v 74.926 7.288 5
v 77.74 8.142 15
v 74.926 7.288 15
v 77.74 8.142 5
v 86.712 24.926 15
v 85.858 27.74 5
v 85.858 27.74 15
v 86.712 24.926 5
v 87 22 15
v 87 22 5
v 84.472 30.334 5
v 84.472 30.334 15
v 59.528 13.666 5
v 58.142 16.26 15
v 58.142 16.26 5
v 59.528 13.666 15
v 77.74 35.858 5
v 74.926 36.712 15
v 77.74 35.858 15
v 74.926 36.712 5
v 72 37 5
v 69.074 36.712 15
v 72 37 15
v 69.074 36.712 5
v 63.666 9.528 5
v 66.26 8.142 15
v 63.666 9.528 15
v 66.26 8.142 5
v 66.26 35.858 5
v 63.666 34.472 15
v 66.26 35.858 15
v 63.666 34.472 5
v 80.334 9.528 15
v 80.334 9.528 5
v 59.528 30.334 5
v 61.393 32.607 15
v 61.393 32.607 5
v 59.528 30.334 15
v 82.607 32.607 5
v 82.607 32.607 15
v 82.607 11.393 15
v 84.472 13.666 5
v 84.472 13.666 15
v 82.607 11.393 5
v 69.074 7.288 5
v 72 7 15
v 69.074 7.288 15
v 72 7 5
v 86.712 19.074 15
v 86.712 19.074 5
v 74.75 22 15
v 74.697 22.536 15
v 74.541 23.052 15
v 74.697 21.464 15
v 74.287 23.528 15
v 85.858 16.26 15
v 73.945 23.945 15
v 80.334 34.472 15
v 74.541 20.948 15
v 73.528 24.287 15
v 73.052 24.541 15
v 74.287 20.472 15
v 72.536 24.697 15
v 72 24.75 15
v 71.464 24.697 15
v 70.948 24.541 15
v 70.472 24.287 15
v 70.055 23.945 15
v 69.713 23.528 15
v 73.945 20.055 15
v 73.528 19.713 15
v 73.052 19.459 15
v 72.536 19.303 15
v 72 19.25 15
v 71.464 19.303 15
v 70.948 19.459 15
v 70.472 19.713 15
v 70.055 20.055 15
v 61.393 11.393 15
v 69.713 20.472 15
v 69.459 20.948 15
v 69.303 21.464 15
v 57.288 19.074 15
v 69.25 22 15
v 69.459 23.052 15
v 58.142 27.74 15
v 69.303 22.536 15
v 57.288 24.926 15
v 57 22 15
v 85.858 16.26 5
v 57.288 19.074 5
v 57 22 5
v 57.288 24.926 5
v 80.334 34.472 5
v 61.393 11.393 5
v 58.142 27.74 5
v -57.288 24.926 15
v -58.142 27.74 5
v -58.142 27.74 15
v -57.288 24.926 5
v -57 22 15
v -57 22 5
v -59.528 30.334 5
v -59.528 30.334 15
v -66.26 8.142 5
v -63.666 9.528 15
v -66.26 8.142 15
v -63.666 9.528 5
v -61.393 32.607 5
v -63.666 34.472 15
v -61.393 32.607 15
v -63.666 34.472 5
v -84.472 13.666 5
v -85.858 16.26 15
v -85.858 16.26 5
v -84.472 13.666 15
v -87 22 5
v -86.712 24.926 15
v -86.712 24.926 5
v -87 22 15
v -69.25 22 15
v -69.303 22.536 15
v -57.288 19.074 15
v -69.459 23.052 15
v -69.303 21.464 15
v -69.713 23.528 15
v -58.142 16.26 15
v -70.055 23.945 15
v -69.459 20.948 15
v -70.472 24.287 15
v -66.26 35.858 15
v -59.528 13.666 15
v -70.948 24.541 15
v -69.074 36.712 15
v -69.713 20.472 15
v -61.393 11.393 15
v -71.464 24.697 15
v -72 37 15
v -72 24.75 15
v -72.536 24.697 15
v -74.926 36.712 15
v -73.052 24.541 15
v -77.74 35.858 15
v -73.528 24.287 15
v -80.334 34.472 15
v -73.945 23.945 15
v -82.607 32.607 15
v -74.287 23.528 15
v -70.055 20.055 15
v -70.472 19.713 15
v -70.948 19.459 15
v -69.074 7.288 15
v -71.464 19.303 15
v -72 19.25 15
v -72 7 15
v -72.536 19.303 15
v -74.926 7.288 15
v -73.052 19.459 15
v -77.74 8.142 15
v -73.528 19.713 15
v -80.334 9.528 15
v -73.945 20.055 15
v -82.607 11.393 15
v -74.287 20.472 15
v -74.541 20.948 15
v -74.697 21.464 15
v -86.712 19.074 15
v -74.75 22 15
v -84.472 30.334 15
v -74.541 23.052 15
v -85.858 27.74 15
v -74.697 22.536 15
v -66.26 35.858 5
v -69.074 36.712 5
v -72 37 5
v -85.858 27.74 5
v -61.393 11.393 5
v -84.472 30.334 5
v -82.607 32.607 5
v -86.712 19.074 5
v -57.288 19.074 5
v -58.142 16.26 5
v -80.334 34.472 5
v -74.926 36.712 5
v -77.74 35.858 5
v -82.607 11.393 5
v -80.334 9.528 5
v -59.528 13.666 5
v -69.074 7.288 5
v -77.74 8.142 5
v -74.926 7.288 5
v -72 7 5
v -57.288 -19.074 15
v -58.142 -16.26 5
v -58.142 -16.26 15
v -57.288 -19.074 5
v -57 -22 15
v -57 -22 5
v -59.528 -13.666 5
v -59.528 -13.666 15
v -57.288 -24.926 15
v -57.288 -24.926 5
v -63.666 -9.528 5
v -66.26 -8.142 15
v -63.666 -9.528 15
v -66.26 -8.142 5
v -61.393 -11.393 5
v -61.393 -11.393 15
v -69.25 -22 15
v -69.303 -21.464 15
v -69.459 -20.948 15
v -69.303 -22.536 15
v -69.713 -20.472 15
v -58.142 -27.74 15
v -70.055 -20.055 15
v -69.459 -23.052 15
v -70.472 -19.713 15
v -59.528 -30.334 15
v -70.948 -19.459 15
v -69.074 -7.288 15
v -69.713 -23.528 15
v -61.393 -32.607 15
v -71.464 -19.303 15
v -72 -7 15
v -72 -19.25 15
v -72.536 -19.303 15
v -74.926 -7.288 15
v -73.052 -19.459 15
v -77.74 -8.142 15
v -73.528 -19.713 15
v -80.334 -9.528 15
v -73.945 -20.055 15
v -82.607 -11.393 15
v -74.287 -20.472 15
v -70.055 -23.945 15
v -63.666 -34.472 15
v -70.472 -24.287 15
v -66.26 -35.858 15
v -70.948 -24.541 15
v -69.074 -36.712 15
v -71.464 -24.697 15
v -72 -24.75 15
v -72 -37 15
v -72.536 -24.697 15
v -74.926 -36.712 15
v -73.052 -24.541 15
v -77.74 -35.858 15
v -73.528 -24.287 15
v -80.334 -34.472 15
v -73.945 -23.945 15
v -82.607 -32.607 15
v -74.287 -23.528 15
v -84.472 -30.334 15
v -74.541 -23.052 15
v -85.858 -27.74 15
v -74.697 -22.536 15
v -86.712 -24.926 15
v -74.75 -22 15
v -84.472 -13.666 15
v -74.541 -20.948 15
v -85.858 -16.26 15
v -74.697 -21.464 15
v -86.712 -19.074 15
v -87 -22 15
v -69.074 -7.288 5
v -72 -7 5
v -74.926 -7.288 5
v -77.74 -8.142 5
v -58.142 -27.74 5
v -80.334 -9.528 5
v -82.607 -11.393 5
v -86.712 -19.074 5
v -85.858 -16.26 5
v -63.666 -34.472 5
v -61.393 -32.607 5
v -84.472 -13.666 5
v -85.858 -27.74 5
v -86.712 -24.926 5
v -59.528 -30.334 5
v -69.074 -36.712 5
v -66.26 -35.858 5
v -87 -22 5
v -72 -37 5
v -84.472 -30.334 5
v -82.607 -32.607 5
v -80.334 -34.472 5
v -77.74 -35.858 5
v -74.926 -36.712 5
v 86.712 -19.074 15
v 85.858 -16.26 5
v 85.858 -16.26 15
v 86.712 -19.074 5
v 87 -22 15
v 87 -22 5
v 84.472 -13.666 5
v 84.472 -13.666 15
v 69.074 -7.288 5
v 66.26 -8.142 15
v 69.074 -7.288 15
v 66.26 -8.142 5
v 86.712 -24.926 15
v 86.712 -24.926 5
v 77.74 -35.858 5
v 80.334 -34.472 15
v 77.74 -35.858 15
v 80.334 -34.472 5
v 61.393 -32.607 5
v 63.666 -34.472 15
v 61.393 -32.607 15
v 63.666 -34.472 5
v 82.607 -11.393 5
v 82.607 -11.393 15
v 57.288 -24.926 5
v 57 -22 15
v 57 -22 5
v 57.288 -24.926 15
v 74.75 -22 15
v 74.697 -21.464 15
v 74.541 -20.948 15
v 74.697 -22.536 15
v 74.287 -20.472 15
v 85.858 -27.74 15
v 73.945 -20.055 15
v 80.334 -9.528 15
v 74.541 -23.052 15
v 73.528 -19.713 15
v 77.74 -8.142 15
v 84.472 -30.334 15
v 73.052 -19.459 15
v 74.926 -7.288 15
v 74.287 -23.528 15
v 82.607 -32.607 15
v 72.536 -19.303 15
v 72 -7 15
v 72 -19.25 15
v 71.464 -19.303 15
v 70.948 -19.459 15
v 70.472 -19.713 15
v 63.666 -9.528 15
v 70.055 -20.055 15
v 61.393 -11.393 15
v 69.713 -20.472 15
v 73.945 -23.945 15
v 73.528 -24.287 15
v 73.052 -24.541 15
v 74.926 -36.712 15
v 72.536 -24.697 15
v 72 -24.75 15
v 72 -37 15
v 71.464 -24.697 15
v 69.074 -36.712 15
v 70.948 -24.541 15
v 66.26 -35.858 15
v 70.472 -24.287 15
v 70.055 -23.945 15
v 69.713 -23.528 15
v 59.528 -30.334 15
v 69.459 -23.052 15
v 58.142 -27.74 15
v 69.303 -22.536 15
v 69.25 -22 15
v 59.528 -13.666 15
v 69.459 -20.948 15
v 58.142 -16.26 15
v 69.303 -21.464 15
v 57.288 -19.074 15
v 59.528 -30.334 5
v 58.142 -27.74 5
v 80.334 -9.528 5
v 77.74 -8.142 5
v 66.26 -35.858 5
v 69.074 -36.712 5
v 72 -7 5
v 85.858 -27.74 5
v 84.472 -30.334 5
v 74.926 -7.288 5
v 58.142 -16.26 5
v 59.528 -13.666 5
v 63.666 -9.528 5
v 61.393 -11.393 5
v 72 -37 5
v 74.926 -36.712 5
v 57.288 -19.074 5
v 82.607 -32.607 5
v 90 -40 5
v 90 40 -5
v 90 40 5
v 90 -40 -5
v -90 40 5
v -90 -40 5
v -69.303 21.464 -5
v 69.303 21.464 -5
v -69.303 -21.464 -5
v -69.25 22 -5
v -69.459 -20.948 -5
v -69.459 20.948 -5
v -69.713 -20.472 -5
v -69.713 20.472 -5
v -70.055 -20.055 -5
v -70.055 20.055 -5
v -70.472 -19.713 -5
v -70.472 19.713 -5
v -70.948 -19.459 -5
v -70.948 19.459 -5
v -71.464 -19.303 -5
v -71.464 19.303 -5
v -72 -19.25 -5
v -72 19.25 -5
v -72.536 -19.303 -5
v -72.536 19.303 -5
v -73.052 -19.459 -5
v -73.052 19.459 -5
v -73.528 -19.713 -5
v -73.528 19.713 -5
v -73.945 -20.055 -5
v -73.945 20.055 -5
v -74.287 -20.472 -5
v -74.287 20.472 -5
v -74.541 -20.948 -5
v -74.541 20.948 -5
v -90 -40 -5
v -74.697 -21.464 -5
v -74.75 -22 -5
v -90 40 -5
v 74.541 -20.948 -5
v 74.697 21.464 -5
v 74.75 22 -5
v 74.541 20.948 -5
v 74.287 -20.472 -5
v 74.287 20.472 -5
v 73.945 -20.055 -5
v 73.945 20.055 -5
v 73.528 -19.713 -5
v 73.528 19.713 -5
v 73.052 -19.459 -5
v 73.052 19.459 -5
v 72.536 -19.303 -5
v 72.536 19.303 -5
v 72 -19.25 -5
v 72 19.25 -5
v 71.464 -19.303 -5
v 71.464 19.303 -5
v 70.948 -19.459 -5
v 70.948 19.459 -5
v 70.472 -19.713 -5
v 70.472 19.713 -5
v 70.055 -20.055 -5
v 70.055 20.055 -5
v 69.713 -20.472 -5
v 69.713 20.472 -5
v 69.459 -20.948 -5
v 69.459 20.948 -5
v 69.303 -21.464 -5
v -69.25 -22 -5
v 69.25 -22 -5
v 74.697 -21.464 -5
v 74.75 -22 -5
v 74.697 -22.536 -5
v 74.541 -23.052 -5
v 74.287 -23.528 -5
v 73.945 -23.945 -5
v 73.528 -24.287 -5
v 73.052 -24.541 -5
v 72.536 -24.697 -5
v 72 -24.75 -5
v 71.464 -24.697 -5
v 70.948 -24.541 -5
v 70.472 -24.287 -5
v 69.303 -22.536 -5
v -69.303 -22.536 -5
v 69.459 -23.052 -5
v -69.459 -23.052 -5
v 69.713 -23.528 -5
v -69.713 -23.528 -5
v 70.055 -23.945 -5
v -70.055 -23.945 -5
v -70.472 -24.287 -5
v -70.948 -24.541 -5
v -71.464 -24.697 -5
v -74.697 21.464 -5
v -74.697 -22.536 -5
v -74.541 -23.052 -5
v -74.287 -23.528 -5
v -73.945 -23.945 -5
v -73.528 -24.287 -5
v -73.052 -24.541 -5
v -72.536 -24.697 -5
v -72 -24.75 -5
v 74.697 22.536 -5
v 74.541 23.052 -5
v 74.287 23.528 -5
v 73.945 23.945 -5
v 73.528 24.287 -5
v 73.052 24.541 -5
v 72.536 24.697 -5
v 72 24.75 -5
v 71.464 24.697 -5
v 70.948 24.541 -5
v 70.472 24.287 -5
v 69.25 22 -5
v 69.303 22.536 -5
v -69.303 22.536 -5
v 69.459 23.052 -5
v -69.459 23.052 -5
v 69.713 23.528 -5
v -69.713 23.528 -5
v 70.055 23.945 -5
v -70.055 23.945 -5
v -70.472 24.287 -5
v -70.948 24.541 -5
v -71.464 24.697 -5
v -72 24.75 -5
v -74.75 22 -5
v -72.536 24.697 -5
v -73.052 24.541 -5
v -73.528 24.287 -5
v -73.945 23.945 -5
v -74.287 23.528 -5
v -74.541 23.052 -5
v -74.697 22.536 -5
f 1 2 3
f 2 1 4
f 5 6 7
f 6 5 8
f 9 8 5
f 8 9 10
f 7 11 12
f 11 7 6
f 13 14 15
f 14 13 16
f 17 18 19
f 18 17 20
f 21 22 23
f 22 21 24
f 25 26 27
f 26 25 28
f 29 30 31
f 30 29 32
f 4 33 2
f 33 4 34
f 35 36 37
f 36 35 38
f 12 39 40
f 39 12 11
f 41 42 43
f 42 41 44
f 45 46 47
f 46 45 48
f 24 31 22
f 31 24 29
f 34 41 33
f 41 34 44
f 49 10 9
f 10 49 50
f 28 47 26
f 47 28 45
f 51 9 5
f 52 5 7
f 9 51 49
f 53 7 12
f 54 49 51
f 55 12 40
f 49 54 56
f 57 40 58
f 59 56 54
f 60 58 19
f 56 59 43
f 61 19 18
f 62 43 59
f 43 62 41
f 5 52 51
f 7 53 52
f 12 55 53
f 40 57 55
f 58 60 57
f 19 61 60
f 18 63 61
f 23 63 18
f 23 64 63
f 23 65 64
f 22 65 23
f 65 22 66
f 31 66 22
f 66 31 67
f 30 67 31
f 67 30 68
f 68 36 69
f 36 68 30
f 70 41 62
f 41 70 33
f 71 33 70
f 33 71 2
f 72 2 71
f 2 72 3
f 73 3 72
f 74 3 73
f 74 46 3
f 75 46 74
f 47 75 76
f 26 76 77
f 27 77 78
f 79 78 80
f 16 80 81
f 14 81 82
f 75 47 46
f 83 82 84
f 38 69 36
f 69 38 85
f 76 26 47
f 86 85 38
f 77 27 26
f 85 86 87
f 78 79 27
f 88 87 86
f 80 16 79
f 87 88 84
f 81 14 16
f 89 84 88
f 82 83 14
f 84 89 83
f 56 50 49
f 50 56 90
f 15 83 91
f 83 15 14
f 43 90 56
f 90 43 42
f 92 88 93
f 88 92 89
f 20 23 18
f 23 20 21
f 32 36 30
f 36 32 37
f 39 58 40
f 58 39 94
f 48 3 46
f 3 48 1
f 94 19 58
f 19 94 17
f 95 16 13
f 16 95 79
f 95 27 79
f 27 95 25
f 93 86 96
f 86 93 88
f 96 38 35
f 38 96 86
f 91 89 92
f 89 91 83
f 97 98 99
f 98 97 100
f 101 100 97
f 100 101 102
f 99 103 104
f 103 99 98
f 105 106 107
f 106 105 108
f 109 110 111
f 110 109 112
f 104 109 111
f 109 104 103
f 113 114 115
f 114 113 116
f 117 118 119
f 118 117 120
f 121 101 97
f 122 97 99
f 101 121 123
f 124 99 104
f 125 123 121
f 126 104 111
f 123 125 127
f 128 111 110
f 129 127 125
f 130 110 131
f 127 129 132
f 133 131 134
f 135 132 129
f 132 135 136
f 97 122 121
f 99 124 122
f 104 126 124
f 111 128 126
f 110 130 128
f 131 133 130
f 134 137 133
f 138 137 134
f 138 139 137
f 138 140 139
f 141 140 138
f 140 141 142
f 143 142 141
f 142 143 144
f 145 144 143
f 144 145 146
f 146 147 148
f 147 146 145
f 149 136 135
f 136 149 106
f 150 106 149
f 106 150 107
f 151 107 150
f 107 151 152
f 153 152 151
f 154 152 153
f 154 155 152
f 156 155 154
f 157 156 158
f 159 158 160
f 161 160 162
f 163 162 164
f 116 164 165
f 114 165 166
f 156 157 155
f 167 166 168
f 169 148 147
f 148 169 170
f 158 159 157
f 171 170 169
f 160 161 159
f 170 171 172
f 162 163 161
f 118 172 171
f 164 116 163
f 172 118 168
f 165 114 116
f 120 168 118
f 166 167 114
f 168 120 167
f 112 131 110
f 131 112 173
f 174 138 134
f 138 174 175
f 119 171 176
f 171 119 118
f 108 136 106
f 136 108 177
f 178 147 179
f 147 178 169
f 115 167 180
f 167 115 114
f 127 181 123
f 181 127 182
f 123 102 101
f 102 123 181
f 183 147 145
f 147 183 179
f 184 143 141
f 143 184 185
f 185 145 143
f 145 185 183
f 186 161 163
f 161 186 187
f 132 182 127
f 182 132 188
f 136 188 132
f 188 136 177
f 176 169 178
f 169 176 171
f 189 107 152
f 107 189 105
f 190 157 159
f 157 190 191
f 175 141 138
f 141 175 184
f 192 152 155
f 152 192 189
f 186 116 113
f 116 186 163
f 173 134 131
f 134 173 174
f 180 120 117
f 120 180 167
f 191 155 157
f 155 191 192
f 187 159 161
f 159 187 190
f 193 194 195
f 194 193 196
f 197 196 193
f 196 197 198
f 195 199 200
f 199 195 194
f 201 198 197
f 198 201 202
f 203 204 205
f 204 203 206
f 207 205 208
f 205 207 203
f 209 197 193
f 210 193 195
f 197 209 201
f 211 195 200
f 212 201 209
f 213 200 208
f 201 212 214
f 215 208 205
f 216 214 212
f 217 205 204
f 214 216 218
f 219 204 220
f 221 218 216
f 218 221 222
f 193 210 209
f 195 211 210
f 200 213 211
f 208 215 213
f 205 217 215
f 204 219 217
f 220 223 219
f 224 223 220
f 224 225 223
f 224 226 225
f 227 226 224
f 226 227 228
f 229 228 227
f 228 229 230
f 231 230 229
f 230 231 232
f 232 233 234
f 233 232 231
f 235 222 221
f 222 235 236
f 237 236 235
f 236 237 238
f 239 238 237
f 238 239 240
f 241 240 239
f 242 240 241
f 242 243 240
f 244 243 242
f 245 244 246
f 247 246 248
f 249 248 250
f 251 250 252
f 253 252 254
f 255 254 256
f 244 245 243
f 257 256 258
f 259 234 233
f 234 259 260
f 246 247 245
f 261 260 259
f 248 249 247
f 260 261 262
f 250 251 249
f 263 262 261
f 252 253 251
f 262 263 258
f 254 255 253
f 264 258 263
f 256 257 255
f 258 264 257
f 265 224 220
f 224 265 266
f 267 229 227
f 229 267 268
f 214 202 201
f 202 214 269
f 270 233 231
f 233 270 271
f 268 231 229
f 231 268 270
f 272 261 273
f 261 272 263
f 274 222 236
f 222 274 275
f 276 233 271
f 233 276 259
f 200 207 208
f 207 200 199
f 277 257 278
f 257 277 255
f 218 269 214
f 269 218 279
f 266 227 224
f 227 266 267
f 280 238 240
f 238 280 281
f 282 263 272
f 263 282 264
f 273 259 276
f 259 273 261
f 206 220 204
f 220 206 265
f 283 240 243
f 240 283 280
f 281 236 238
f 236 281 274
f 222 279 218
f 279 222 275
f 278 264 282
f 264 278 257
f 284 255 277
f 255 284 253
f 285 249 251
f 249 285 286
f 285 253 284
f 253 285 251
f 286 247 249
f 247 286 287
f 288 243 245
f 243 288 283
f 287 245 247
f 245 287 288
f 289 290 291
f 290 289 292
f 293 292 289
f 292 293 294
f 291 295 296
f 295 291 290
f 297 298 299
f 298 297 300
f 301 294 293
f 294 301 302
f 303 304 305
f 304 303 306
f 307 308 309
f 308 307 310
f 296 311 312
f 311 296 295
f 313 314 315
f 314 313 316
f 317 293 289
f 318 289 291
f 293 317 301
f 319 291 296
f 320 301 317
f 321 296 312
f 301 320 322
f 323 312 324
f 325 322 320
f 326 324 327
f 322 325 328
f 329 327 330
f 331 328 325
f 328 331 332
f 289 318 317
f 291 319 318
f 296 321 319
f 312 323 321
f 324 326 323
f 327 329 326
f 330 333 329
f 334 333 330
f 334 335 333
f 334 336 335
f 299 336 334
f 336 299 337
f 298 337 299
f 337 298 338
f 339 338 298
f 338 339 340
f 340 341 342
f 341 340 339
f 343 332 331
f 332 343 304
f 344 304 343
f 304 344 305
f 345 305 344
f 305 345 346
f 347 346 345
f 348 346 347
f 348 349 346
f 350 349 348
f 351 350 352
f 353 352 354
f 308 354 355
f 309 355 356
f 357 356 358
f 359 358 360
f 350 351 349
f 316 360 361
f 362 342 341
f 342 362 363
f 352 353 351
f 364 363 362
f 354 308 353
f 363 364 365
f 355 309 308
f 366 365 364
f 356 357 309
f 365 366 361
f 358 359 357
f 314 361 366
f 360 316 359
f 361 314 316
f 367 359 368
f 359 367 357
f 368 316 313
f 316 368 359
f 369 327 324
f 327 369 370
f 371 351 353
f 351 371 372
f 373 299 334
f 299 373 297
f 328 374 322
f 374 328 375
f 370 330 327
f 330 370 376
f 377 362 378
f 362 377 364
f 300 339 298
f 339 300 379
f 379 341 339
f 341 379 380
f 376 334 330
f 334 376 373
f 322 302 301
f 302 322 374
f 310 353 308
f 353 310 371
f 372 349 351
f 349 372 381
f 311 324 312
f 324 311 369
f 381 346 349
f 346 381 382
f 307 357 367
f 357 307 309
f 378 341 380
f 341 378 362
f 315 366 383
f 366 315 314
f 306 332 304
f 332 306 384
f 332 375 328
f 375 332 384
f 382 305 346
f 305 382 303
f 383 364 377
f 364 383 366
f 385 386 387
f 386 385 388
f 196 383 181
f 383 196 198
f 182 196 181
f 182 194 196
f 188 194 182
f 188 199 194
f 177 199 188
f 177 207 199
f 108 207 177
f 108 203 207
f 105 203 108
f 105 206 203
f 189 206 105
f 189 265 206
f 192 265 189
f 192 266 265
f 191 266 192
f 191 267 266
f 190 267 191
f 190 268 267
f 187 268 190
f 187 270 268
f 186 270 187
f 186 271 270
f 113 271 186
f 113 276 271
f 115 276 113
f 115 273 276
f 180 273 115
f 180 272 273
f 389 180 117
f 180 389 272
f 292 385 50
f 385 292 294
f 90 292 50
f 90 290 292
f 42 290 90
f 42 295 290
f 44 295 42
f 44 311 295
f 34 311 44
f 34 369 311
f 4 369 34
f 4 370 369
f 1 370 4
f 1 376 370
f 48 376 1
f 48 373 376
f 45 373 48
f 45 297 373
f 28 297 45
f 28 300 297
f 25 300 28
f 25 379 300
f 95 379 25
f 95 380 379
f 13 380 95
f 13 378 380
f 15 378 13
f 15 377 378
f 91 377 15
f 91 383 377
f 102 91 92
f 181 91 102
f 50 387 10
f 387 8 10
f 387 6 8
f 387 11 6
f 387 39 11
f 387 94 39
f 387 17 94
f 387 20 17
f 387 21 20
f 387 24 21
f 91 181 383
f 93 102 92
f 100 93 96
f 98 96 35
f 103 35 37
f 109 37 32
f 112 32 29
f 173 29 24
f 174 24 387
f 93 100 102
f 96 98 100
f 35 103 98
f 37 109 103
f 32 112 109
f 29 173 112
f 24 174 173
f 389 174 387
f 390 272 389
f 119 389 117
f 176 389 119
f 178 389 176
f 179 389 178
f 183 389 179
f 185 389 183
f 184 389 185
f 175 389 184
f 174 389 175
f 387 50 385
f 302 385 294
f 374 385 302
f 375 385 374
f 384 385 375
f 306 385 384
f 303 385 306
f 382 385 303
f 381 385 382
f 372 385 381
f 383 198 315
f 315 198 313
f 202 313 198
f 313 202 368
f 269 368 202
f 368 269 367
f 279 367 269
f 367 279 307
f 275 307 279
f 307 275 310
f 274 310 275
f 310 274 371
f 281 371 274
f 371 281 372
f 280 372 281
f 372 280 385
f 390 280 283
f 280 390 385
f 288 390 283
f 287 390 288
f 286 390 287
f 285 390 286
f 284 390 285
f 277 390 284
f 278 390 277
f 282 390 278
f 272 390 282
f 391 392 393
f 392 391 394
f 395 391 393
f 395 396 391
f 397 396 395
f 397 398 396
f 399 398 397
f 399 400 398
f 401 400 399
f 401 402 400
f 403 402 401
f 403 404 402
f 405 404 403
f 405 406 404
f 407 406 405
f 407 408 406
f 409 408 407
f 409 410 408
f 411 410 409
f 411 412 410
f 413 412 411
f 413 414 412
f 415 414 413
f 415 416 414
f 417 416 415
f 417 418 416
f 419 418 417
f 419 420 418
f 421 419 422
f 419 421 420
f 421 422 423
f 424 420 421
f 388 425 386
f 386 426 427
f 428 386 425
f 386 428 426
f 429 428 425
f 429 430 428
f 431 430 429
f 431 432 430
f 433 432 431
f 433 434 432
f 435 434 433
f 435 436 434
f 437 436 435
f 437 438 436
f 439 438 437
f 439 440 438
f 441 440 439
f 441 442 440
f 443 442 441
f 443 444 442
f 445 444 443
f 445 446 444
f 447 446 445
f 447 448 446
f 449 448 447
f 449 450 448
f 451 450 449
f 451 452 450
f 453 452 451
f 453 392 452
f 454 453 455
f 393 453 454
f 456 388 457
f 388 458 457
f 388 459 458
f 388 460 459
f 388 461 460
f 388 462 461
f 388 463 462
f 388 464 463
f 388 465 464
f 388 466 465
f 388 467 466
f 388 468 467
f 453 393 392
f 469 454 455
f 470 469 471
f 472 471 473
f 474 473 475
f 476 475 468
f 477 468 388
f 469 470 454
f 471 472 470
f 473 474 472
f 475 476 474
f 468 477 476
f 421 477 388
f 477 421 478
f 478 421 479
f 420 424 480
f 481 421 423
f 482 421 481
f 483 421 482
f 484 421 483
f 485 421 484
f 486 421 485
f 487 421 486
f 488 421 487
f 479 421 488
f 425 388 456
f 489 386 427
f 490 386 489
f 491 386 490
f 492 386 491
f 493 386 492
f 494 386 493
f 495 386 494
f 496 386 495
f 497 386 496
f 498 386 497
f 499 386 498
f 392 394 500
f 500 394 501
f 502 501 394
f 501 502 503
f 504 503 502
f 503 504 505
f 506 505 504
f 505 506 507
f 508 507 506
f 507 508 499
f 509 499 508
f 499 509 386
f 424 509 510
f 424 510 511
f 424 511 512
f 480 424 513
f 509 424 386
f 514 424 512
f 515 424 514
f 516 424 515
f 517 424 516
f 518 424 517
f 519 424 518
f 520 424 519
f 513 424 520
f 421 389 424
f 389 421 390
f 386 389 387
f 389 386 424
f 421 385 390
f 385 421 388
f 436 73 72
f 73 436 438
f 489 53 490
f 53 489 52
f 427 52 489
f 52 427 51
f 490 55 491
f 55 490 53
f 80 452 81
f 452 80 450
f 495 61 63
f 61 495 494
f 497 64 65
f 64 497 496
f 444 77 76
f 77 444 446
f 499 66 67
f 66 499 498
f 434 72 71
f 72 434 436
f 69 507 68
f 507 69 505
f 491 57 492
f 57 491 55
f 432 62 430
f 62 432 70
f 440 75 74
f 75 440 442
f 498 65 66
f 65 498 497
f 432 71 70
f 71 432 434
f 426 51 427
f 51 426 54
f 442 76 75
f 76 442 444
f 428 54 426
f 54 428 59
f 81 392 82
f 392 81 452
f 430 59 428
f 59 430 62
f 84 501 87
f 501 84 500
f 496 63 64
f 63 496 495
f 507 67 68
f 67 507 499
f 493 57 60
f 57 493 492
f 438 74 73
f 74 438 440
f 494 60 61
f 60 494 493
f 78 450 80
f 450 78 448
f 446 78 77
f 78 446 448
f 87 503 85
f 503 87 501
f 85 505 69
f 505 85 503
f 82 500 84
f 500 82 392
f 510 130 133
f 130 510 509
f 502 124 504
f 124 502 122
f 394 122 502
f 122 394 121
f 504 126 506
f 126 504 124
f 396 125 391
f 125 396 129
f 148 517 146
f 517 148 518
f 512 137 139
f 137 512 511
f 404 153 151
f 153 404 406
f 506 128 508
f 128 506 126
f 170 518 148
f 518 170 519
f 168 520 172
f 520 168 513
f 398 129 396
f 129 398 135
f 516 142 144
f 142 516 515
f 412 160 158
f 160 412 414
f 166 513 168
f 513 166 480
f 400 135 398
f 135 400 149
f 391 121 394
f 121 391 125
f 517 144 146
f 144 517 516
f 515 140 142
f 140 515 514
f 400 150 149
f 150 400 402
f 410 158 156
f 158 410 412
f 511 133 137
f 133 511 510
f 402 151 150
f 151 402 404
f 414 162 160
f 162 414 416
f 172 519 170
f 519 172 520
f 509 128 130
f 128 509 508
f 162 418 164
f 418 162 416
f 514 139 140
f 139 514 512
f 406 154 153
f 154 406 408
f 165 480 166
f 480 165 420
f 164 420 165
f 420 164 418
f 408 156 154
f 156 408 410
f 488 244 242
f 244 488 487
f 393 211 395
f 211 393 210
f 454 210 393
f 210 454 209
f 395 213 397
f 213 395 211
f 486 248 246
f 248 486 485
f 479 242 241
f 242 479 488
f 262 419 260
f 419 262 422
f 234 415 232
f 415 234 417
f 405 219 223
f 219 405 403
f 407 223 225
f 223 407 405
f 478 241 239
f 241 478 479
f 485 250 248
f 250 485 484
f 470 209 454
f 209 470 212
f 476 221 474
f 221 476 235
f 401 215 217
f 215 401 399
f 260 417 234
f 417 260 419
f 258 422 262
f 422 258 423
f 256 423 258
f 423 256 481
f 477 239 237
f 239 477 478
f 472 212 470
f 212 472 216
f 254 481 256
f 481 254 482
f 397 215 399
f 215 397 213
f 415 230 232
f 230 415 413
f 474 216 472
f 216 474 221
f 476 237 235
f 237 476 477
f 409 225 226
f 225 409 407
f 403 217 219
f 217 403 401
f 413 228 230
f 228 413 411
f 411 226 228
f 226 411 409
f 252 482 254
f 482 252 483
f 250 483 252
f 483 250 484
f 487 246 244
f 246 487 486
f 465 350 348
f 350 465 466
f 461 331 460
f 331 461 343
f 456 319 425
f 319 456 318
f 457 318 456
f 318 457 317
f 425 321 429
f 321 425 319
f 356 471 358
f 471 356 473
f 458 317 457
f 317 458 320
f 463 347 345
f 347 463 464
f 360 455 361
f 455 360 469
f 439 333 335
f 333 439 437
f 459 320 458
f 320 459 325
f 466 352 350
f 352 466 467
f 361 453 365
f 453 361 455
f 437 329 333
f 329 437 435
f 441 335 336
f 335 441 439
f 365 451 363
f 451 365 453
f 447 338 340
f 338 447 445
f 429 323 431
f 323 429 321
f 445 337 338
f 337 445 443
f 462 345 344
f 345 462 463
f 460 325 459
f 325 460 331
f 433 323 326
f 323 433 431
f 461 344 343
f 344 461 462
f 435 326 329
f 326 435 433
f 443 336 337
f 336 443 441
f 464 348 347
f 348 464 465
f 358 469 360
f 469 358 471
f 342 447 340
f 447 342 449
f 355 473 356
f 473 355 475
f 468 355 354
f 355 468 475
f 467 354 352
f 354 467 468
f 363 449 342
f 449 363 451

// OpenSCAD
$fn = 32;

// ----------------------------------------------------------------------
// Anchor pads 180 x 80 x 20
// four corner bosses with anchor holes
// ----------------------------------------------------------------------

// --- parameters (mm) ---
plate = [180, 80, 10];  // base plate size (x, y, z)
pads = 4;               // boss count, one per corner
edge = 18;              // boss centre offset from the plate edge
boss_d = 30;            // boss diameter
boss_h = 10;            // boss height above the base plate
hole_d = 5.5;           // hole diameter

// --- derived feature positions (mm) ---
height = plate[2] + boss_h;      // = 20   overall height of the part
corner_x = plate[0] / 2 - edge;  // = 72   boss centre X
corner_y = plate[1] / 2 - edge;  // = 22   boss centre Y
feature_centers = [
  [corner_x, corner_y],
  [-corner_x, corner_y],
  [-corner_x, -corner_y],
  [corner_x, -corner_y]
];   // boss centres, anchor holes are drilled there

// base plate, four bosses standing on it, anchor holes all the way through
difference() {
  union() {
    cube(plate, center = true);
    for (centre = feature_centers)
      translate([centre[0], centre[1], plate[2] / 2 - 1])
        cylinder(d = boss_d, h = boss_h + 1);
  }
  for (centre = feature_centers)
    translate([centre[0], centre[1], -height])
      cylinder(d = hole_d, h = 2 * height + 2);  // through boss and plate
}
